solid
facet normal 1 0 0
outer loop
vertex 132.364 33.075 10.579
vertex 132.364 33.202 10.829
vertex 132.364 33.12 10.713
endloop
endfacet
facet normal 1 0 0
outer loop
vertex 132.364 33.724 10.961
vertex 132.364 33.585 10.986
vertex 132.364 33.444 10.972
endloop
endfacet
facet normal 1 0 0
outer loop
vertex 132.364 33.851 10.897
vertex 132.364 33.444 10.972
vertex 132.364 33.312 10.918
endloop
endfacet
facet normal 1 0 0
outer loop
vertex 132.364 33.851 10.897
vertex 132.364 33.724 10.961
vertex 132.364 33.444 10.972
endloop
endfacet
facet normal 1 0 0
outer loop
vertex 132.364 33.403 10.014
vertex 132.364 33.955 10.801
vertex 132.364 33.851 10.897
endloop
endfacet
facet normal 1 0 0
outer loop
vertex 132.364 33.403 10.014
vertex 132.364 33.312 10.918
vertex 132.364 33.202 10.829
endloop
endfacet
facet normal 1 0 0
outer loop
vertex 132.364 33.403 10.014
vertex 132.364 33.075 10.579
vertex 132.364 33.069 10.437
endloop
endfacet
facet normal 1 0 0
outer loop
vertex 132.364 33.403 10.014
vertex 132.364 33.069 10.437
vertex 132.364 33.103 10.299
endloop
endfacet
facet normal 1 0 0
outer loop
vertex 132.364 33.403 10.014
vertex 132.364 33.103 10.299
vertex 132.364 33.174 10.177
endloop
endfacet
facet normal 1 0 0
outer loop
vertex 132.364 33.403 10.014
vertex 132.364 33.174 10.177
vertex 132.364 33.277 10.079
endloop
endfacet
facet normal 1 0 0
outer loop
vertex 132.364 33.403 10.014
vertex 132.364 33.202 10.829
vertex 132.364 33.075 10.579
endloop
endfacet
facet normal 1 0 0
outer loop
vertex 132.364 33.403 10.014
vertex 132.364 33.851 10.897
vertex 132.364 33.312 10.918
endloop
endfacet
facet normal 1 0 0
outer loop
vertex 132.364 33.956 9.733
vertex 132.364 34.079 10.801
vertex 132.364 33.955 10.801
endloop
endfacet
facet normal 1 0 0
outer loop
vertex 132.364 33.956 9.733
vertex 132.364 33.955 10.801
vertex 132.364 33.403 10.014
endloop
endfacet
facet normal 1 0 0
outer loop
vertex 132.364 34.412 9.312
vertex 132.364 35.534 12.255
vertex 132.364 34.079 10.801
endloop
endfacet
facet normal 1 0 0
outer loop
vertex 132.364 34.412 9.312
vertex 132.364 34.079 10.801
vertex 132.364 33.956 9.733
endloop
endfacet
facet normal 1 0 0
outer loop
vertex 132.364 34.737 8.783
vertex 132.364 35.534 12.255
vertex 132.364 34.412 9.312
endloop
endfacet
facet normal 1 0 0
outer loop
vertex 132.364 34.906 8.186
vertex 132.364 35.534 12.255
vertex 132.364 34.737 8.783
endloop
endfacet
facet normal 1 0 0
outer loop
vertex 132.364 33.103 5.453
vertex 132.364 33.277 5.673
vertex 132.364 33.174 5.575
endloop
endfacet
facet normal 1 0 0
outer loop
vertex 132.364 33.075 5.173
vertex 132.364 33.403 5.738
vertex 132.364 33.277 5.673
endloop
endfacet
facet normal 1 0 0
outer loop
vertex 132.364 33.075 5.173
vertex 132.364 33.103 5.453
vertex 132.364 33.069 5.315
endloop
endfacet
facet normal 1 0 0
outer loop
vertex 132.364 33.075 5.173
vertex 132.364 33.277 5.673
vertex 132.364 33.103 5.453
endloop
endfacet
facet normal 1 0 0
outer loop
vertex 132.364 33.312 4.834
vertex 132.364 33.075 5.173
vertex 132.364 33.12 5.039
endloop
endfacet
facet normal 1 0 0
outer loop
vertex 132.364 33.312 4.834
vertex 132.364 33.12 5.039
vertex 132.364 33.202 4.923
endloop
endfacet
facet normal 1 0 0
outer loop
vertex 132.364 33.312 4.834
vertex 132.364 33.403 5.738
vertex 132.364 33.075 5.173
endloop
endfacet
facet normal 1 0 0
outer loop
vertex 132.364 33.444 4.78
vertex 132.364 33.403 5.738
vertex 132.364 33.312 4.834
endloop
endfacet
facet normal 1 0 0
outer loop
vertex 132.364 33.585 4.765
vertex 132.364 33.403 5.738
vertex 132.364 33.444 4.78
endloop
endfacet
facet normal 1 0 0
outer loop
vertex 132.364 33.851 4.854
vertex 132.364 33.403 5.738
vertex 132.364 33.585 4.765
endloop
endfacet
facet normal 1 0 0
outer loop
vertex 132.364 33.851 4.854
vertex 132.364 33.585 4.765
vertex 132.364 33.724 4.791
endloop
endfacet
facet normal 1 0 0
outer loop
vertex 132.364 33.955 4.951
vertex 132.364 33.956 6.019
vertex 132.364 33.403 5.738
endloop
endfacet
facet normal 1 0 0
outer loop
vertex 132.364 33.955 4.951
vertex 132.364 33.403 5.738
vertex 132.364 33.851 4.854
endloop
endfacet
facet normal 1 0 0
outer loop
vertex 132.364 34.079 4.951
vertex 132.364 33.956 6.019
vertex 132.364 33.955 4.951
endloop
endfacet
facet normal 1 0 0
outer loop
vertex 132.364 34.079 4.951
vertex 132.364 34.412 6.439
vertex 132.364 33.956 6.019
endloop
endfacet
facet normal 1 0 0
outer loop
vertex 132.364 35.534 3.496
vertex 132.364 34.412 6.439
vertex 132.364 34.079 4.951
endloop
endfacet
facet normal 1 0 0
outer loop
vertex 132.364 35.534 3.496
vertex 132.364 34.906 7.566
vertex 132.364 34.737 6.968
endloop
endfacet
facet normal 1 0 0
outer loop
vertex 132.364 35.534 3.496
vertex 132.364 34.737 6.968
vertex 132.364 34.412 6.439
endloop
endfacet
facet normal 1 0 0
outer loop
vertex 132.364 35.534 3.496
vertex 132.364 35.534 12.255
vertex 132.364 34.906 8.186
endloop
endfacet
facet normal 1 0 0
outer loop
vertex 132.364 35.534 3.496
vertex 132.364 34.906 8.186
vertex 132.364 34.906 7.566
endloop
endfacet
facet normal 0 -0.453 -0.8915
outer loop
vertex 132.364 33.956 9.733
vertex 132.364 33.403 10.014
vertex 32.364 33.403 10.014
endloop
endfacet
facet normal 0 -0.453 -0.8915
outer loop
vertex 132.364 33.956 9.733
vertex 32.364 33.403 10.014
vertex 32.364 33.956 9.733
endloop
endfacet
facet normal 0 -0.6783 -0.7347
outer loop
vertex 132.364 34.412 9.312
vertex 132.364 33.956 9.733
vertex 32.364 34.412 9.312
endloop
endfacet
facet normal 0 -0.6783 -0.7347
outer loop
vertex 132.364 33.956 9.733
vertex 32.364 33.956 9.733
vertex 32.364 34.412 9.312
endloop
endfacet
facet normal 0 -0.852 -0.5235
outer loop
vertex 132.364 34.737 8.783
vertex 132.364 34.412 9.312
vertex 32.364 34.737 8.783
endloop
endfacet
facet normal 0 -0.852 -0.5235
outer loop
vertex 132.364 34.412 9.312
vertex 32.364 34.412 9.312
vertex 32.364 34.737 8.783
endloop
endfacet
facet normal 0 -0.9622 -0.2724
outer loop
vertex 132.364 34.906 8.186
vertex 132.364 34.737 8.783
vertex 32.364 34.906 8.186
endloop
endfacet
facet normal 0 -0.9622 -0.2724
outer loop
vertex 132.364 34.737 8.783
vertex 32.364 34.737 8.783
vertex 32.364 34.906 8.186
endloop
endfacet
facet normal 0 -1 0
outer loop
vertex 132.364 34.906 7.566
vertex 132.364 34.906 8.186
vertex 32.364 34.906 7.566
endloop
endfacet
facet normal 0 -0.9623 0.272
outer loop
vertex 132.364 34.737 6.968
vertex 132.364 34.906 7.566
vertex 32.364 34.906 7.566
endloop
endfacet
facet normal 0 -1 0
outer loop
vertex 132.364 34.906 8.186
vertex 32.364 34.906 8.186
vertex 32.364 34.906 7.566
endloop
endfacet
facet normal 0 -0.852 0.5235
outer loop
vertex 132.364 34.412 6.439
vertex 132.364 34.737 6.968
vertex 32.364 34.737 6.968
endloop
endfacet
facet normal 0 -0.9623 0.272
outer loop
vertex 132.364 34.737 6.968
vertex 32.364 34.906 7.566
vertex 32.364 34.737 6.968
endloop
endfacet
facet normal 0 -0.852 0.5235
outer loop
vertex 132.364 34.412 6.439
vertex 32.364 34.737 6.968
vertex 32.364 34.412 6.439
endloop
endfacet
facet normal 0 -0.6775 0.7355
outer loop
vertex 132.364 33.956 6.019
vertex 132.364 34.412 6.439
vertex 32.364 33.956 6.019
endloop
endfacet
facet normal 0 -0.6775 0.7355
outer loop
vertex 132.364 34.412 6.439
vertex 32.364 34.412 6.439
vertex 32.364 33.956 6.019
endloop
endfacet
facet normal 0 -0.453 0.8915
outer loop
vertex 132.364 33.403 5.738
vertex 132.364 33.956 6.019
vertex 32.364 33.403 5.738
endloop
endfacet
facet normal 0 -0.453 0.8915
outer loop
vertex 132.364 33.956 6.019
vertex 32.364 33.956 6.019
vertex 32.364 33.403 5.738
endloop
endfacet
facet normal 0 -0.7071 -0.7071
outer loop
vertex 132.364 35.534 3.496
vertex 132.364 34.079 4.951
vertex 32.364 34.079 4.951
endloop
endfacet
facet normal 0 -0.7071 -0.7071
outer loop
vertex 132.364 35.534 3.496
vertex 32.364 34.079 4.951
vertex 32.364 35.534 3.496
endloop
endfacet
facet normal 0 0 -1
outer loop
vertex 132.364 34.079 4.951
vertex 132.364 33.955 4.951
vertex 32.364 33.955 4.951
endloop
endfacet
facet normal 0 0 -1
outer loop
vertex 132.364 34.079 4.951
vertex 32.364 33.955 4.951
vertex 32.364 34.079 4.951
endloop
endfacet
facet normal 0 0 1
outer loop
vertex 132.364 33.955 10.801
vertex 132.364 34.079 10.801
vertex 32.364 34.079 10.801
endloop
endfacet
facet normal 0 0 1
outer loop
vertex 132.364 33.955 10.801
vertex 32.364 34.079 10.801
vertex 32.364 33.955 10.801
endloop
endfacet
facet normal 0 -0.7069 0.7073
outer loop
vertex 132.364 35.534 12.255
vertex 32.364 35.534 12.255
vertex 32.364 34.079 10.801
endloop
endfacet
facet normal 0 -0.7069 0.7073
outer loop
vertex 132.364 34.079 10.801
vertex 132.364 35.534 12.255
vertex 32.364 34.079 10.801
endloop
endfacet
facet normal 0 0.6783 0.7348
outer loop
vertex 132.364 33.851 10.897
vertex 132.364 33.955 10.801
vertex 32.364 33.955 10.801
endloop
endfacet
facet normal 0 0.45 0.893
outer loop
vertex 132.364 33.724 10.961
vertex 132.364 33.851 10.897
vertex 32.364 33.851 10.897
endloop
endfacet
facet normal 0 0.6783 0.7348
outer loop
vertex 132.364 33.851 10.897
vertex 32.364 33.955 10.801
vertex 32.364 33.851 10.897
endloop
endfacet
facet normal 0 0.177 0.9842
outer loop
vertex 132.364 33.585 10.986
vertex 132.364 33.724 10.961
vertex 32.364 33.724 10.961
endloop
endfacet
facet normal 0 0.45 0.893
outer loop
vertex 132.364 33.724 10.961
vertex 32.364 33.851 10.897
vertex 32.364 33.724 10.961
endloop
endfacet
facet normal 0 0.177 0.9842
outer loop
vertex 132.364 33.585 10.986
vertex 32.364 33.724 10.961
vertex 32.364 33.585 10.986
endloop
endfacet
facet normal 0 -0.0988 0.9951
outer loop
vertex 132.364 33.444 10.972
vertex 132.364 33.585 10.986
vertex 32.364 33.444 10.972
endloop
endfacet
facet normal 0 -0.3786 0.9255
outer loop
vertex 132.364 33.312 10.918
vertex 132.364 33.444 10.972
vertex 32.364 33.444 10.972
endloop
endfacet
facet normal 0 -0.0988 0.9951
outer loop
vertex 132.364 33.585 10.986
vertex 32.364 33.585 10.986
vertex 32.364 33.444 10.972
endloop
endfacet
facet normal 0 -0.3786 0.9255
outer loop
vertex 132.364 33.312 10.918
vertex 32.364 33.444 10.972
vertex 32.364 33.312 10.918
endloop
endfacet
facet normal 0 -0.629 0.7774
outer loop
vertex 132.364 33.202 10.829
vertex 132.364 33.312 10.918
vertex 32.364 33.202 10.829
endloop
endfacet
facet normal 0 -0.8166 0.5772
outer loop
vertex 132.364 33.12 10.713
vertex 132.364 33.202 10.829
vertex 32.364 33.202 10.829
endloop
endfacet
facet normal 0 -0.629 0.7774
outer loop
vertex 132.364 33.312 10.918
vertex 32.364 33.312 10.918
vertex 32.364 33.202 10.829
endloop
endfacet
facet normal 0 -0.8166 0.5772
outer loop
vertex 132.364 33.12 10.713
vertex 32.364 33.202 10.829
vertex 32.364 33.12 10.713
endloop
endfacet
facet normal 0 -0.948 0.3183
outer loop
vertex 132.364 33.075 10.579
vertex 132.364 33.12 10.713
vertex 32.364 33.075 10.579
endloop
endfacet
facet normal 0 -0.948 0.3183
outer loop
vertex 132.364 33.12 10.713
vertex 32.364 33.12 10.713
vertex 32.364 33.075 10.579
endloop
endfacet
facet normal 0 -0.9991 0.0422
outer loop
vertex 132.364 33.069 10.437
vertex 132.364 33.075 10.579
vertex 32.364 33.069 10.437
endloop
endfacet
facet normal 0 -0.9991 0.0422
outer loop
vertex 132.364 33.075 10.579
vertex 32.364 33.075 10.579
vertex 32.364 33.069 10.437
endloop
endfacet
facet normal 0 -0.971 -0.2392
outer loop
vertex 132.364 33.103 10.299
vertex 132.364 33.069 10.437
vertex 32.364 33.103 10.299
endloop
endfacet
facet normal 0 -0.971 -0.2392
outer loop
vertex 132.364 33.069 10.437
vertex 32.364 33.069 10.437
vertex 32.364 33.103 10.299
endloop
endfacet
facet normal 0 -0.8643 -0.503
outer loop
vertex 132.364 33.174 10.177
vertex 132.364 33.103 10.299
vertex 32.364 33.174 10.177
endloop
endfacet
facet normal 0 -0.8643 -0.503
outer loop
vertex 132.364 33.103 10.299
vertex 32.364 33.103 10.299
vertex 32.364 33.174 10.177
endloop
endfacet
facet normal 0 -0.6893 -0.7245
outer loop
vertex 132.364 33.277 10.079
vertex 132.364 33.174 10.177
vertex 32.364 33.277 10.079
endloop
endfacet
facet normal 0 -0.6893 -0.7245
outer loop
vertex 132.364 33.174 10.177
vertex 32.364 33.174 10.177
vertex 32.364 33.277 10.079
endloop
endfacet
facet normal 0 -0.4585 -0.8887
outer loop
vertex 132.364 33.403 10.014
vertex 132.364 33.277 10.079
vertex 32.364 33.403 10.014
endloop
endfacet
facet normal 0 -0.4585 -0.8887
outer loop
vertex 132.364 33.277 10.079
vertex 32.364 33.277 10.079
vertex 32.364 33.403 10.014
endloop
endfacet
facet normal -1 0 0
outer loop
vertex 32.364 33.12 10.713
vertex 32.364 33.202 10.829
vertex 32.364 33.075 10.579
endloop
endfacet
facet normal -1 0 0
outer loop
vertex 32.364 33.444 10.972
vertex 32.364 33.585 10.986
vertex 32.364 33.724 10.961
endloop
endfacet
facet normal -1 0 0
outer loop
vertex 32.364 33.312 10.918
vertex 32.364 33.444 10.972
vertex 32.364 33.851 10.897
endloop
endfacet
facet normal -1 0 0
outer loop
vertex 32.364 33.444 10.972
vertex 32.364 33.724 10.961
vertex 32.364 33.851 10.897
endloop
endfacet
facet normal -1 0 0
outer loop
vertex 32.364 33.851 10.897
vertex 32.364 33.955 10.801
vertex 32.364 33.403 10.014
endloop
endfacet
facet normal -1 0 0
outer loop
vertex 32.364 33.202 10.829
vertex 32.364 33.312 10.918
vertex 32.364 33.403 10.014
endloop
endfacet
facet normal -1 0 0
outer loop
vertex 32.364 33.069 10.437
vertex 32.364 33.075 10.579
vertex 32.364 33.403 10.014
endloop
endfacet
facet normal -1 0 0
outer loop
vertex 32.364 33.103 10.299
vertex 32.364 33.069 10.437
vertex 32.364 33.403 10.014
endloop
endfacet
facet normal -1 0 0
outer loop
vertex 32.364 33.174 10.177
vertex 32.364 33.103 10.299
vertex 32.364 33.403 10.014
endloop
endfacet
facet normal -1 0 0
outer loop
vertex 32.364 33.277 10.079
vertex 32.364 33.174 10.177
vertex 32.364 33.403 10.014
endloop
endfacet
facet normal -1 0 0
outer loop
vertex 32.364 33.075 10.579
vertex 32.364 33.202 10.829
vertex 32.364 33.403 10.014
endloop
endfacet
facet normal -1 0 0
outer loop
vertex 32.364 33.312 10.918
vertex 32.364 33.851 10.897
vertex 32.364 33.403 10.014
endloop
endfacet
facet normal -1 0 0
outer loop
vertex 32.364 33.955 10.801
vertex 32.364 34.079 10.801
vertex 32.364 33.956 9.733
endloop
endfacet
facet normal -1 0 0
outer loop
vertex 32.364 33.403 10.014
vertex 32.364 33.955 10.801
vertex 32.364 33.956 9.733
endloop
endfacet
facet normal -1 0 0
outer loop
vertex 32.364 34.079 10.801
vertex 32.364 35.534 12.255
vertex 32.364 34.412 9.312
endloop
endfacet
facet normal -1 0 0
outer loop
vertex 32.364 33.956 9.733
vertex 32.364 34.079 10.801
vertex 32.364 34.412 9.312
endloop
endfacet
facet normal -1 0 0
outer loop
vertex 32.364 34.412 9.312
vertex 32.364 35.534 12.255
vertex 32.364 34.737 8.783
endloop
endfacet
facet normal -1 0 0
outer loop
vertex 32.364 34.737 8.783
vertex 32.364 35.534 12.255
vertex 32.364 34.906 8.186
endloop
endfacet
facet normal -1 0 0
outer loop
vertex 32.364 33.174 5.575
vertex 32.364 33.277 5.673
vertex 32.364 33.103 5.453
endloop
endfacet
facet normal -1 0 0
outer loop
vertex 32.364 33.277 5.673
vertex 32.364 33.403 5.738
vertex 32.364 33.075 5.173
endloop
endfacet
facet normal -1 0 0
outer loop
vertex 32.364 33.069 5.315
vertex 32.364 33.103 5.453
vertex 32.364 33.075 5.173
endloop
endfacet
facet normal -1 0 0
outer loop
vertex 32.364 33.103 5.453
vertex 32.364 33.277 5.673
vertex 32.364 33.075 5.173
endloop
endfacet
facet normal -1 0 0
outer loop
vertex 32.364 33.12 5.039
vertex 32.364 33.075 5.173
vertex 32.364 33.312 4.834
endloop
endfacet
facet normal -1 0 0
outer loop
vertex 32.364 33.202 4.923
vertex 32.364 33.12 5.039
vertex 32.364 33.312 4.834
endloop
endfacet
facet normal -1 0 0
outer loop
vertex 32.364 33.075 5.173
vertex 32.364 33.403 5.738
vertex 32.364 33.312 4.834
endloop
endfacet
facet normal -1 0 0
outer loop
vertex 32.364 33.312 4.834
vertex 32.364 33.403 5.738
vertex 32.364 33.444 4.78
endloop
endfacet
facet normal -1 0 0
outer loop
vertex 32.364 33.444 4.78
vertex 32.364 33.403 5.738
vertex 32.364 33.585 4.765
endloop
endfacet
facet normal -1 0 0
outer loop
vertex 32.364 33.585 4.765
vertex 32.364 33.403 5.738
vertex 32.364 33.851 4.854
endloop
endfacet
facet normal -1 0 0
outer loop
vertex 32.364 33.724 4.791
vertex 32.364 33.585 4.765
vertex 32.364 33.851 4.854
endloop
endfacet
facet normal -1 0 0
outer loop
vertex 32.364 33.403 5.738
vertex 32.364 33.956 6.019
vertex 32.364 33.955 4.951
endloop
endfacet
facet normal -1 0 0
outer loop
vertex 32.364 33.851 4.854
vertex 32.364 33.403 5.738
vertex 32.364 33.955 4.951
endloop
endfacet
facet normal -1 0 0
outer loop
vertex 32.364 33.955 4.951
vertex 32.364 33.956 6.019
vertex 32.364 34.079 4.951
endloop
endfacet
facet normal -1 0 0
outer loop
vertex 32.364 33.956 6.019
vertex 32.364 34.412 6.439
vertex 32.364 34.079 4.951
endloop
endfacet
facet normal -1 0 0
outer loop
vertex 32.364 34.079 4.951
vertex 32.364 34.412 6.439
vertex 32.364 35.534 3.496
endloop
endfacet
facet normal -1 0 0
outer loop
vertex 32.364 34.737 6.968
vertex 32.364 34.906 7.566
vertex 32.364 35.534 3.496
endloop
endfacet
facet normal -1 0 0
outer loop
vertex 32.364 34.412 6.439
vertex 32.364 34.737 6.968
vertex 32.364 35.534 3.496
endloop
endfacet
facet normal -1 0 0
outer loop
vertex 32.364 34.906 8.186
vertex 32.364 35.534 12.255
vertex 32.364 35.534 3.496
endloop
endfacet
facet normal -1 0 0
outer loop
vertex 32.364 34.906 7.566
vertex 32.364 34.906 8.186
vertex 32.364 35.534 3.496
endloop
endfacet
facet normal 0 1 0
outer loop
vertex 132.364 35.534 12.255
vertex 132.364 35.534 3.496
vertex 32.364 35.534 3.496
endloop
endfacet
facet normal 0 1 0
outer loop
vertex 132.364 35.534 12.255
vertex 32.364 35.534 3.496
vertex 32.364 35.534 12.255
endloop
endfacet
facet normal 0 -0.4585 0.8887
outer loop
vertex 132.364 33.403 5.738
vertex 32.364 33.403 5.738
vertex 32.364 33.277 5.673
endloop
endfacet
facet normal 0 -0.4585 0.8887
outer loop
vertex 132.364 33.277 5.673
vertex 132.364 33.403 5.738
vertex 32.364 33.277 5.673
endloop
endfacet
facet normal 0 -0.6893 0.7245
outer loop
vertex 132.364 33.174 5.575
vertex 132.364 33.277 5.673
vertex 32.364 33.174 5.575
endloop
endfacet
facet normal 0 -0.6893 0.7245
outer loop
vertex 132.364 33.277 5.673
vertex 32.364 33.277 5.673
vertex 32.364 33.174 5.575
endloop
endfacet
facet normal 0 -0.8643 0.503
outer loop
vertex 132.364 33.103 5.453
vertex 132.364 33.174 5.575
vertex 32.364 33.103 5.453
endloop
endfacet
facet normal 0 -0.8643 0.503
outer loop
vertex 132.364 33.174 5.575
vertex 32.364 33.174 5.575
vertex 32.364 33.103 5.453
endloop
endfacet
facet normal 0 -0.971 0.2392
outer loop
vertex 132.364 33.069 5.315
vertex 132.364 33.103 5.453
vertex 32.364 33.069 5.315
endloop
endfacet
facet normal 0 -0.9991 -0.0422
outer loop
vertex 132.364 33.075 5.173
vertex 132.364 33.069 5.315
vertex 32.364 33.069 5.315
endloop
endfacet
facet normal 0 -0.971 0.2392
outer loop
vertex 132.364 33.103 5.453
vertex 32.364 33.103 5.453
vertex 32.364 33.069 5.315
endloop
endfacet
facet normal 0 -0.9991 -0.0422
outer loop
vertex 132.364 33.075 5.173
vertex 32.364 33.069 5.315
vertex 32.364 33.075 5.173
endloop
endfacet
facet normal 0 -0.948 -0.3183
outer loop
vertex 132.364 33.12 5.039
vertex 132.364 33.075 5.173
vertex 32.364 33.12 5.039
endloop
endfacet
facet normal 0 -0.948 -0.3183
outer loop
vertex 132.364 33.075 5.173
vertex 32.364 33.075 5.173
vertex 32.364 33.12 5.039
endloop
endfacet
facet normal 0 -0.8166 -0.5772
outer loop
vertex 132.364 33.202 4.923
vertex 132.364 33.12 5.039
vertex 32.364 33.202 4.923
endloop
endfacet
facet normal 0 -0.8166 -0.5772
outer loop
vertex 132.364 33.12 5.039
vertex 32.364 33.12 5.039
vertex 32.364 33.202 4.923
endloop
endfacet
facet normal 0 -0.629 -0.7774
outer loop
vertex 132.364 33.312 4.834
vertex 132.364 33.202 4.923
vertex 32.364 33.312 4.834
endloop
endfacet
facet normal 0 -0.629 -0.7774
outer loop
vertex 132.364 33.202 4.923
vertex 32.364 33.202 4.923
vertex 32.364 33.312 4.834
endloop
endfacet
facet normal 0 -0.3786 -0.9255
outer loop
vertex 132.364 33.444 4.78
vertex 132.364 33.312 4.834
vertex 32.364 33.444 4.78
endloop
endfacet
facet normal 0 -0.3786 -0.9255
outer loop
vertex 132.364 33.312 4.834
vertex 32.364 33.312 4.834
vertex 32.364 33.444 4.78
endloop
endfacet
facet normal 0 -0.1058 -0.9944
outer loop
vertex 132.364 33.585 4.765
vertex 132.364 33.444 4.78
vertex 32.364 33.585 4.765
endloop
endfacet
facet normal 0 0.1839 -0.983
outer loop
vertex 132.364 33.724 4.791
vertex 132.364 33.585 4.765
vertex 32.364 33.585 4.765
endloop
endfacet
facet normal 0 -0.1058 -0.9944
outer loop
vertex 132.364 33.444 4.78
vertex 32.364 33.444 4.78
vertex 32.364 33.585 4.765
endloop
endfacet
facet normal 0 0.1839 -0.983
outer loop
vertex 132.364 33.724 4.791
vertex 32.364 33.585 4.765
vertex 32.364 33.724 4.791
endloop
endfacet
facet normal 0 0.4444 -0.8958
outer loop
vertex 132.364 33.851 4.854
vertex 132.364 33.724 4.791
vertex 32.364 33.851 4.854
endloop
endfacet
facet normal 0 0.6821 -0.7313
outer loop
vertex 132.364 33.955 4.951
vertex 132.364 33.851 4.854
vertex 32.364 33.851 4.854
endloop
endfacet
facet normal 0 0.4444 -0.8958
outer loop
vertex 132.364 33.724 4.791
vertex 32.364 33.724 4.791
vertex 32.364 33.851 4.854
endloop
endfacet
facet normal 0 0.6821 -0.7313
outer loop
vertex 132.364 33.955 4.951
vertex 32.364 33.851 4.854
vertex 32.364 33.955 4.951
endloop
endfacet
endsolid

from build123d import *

# Parameters (mm, degrees)
BOSS_EXTRUDE1_DEPTH = 100


with BuildPart() as part:
    # Sketch1 → Boss-Extrude1 (new body)
    with BuildSketch(Plane(origin=(32.364284334, 0, 0), x_dir=(0, 0, -1), z_dir=(1, 0, 0))):
        with BuildLine():
            ThreePointArc((-10.800866483, 33.955059464), (-10.773935743, 33.156778763), (-10.014083429, 33.402953098))
            ThreePointArc((-10.014083429, 33.402953098), (-7.875866483, 34.92701851), (-5.737649536, 33.402953098))
            ThreePointArc((-5.737649536, 33.402953098), (-4.977797222, 33.156778763), (-4.950866483, 33.955059464))
            Line((-4.950866483, 33.955059464), (-4.950866483, 34.079201599))
            Line((-4.950866483, 34.079201599), (-3.496394261, 35.533673821))
            Line((-3.496394261, 35.533673821), (-12.255338704, 35.533673821))
            Line((-12.255338704, 35.533673821), (-10.800866483, 34.079201599))
            Line((-10.800866483, 34.079201599), (-10.800866483, 33.955059464))
        make_face()
    extrude(amount=BOSS_EXTRUDE1_DEPTH)


solid = part.part
